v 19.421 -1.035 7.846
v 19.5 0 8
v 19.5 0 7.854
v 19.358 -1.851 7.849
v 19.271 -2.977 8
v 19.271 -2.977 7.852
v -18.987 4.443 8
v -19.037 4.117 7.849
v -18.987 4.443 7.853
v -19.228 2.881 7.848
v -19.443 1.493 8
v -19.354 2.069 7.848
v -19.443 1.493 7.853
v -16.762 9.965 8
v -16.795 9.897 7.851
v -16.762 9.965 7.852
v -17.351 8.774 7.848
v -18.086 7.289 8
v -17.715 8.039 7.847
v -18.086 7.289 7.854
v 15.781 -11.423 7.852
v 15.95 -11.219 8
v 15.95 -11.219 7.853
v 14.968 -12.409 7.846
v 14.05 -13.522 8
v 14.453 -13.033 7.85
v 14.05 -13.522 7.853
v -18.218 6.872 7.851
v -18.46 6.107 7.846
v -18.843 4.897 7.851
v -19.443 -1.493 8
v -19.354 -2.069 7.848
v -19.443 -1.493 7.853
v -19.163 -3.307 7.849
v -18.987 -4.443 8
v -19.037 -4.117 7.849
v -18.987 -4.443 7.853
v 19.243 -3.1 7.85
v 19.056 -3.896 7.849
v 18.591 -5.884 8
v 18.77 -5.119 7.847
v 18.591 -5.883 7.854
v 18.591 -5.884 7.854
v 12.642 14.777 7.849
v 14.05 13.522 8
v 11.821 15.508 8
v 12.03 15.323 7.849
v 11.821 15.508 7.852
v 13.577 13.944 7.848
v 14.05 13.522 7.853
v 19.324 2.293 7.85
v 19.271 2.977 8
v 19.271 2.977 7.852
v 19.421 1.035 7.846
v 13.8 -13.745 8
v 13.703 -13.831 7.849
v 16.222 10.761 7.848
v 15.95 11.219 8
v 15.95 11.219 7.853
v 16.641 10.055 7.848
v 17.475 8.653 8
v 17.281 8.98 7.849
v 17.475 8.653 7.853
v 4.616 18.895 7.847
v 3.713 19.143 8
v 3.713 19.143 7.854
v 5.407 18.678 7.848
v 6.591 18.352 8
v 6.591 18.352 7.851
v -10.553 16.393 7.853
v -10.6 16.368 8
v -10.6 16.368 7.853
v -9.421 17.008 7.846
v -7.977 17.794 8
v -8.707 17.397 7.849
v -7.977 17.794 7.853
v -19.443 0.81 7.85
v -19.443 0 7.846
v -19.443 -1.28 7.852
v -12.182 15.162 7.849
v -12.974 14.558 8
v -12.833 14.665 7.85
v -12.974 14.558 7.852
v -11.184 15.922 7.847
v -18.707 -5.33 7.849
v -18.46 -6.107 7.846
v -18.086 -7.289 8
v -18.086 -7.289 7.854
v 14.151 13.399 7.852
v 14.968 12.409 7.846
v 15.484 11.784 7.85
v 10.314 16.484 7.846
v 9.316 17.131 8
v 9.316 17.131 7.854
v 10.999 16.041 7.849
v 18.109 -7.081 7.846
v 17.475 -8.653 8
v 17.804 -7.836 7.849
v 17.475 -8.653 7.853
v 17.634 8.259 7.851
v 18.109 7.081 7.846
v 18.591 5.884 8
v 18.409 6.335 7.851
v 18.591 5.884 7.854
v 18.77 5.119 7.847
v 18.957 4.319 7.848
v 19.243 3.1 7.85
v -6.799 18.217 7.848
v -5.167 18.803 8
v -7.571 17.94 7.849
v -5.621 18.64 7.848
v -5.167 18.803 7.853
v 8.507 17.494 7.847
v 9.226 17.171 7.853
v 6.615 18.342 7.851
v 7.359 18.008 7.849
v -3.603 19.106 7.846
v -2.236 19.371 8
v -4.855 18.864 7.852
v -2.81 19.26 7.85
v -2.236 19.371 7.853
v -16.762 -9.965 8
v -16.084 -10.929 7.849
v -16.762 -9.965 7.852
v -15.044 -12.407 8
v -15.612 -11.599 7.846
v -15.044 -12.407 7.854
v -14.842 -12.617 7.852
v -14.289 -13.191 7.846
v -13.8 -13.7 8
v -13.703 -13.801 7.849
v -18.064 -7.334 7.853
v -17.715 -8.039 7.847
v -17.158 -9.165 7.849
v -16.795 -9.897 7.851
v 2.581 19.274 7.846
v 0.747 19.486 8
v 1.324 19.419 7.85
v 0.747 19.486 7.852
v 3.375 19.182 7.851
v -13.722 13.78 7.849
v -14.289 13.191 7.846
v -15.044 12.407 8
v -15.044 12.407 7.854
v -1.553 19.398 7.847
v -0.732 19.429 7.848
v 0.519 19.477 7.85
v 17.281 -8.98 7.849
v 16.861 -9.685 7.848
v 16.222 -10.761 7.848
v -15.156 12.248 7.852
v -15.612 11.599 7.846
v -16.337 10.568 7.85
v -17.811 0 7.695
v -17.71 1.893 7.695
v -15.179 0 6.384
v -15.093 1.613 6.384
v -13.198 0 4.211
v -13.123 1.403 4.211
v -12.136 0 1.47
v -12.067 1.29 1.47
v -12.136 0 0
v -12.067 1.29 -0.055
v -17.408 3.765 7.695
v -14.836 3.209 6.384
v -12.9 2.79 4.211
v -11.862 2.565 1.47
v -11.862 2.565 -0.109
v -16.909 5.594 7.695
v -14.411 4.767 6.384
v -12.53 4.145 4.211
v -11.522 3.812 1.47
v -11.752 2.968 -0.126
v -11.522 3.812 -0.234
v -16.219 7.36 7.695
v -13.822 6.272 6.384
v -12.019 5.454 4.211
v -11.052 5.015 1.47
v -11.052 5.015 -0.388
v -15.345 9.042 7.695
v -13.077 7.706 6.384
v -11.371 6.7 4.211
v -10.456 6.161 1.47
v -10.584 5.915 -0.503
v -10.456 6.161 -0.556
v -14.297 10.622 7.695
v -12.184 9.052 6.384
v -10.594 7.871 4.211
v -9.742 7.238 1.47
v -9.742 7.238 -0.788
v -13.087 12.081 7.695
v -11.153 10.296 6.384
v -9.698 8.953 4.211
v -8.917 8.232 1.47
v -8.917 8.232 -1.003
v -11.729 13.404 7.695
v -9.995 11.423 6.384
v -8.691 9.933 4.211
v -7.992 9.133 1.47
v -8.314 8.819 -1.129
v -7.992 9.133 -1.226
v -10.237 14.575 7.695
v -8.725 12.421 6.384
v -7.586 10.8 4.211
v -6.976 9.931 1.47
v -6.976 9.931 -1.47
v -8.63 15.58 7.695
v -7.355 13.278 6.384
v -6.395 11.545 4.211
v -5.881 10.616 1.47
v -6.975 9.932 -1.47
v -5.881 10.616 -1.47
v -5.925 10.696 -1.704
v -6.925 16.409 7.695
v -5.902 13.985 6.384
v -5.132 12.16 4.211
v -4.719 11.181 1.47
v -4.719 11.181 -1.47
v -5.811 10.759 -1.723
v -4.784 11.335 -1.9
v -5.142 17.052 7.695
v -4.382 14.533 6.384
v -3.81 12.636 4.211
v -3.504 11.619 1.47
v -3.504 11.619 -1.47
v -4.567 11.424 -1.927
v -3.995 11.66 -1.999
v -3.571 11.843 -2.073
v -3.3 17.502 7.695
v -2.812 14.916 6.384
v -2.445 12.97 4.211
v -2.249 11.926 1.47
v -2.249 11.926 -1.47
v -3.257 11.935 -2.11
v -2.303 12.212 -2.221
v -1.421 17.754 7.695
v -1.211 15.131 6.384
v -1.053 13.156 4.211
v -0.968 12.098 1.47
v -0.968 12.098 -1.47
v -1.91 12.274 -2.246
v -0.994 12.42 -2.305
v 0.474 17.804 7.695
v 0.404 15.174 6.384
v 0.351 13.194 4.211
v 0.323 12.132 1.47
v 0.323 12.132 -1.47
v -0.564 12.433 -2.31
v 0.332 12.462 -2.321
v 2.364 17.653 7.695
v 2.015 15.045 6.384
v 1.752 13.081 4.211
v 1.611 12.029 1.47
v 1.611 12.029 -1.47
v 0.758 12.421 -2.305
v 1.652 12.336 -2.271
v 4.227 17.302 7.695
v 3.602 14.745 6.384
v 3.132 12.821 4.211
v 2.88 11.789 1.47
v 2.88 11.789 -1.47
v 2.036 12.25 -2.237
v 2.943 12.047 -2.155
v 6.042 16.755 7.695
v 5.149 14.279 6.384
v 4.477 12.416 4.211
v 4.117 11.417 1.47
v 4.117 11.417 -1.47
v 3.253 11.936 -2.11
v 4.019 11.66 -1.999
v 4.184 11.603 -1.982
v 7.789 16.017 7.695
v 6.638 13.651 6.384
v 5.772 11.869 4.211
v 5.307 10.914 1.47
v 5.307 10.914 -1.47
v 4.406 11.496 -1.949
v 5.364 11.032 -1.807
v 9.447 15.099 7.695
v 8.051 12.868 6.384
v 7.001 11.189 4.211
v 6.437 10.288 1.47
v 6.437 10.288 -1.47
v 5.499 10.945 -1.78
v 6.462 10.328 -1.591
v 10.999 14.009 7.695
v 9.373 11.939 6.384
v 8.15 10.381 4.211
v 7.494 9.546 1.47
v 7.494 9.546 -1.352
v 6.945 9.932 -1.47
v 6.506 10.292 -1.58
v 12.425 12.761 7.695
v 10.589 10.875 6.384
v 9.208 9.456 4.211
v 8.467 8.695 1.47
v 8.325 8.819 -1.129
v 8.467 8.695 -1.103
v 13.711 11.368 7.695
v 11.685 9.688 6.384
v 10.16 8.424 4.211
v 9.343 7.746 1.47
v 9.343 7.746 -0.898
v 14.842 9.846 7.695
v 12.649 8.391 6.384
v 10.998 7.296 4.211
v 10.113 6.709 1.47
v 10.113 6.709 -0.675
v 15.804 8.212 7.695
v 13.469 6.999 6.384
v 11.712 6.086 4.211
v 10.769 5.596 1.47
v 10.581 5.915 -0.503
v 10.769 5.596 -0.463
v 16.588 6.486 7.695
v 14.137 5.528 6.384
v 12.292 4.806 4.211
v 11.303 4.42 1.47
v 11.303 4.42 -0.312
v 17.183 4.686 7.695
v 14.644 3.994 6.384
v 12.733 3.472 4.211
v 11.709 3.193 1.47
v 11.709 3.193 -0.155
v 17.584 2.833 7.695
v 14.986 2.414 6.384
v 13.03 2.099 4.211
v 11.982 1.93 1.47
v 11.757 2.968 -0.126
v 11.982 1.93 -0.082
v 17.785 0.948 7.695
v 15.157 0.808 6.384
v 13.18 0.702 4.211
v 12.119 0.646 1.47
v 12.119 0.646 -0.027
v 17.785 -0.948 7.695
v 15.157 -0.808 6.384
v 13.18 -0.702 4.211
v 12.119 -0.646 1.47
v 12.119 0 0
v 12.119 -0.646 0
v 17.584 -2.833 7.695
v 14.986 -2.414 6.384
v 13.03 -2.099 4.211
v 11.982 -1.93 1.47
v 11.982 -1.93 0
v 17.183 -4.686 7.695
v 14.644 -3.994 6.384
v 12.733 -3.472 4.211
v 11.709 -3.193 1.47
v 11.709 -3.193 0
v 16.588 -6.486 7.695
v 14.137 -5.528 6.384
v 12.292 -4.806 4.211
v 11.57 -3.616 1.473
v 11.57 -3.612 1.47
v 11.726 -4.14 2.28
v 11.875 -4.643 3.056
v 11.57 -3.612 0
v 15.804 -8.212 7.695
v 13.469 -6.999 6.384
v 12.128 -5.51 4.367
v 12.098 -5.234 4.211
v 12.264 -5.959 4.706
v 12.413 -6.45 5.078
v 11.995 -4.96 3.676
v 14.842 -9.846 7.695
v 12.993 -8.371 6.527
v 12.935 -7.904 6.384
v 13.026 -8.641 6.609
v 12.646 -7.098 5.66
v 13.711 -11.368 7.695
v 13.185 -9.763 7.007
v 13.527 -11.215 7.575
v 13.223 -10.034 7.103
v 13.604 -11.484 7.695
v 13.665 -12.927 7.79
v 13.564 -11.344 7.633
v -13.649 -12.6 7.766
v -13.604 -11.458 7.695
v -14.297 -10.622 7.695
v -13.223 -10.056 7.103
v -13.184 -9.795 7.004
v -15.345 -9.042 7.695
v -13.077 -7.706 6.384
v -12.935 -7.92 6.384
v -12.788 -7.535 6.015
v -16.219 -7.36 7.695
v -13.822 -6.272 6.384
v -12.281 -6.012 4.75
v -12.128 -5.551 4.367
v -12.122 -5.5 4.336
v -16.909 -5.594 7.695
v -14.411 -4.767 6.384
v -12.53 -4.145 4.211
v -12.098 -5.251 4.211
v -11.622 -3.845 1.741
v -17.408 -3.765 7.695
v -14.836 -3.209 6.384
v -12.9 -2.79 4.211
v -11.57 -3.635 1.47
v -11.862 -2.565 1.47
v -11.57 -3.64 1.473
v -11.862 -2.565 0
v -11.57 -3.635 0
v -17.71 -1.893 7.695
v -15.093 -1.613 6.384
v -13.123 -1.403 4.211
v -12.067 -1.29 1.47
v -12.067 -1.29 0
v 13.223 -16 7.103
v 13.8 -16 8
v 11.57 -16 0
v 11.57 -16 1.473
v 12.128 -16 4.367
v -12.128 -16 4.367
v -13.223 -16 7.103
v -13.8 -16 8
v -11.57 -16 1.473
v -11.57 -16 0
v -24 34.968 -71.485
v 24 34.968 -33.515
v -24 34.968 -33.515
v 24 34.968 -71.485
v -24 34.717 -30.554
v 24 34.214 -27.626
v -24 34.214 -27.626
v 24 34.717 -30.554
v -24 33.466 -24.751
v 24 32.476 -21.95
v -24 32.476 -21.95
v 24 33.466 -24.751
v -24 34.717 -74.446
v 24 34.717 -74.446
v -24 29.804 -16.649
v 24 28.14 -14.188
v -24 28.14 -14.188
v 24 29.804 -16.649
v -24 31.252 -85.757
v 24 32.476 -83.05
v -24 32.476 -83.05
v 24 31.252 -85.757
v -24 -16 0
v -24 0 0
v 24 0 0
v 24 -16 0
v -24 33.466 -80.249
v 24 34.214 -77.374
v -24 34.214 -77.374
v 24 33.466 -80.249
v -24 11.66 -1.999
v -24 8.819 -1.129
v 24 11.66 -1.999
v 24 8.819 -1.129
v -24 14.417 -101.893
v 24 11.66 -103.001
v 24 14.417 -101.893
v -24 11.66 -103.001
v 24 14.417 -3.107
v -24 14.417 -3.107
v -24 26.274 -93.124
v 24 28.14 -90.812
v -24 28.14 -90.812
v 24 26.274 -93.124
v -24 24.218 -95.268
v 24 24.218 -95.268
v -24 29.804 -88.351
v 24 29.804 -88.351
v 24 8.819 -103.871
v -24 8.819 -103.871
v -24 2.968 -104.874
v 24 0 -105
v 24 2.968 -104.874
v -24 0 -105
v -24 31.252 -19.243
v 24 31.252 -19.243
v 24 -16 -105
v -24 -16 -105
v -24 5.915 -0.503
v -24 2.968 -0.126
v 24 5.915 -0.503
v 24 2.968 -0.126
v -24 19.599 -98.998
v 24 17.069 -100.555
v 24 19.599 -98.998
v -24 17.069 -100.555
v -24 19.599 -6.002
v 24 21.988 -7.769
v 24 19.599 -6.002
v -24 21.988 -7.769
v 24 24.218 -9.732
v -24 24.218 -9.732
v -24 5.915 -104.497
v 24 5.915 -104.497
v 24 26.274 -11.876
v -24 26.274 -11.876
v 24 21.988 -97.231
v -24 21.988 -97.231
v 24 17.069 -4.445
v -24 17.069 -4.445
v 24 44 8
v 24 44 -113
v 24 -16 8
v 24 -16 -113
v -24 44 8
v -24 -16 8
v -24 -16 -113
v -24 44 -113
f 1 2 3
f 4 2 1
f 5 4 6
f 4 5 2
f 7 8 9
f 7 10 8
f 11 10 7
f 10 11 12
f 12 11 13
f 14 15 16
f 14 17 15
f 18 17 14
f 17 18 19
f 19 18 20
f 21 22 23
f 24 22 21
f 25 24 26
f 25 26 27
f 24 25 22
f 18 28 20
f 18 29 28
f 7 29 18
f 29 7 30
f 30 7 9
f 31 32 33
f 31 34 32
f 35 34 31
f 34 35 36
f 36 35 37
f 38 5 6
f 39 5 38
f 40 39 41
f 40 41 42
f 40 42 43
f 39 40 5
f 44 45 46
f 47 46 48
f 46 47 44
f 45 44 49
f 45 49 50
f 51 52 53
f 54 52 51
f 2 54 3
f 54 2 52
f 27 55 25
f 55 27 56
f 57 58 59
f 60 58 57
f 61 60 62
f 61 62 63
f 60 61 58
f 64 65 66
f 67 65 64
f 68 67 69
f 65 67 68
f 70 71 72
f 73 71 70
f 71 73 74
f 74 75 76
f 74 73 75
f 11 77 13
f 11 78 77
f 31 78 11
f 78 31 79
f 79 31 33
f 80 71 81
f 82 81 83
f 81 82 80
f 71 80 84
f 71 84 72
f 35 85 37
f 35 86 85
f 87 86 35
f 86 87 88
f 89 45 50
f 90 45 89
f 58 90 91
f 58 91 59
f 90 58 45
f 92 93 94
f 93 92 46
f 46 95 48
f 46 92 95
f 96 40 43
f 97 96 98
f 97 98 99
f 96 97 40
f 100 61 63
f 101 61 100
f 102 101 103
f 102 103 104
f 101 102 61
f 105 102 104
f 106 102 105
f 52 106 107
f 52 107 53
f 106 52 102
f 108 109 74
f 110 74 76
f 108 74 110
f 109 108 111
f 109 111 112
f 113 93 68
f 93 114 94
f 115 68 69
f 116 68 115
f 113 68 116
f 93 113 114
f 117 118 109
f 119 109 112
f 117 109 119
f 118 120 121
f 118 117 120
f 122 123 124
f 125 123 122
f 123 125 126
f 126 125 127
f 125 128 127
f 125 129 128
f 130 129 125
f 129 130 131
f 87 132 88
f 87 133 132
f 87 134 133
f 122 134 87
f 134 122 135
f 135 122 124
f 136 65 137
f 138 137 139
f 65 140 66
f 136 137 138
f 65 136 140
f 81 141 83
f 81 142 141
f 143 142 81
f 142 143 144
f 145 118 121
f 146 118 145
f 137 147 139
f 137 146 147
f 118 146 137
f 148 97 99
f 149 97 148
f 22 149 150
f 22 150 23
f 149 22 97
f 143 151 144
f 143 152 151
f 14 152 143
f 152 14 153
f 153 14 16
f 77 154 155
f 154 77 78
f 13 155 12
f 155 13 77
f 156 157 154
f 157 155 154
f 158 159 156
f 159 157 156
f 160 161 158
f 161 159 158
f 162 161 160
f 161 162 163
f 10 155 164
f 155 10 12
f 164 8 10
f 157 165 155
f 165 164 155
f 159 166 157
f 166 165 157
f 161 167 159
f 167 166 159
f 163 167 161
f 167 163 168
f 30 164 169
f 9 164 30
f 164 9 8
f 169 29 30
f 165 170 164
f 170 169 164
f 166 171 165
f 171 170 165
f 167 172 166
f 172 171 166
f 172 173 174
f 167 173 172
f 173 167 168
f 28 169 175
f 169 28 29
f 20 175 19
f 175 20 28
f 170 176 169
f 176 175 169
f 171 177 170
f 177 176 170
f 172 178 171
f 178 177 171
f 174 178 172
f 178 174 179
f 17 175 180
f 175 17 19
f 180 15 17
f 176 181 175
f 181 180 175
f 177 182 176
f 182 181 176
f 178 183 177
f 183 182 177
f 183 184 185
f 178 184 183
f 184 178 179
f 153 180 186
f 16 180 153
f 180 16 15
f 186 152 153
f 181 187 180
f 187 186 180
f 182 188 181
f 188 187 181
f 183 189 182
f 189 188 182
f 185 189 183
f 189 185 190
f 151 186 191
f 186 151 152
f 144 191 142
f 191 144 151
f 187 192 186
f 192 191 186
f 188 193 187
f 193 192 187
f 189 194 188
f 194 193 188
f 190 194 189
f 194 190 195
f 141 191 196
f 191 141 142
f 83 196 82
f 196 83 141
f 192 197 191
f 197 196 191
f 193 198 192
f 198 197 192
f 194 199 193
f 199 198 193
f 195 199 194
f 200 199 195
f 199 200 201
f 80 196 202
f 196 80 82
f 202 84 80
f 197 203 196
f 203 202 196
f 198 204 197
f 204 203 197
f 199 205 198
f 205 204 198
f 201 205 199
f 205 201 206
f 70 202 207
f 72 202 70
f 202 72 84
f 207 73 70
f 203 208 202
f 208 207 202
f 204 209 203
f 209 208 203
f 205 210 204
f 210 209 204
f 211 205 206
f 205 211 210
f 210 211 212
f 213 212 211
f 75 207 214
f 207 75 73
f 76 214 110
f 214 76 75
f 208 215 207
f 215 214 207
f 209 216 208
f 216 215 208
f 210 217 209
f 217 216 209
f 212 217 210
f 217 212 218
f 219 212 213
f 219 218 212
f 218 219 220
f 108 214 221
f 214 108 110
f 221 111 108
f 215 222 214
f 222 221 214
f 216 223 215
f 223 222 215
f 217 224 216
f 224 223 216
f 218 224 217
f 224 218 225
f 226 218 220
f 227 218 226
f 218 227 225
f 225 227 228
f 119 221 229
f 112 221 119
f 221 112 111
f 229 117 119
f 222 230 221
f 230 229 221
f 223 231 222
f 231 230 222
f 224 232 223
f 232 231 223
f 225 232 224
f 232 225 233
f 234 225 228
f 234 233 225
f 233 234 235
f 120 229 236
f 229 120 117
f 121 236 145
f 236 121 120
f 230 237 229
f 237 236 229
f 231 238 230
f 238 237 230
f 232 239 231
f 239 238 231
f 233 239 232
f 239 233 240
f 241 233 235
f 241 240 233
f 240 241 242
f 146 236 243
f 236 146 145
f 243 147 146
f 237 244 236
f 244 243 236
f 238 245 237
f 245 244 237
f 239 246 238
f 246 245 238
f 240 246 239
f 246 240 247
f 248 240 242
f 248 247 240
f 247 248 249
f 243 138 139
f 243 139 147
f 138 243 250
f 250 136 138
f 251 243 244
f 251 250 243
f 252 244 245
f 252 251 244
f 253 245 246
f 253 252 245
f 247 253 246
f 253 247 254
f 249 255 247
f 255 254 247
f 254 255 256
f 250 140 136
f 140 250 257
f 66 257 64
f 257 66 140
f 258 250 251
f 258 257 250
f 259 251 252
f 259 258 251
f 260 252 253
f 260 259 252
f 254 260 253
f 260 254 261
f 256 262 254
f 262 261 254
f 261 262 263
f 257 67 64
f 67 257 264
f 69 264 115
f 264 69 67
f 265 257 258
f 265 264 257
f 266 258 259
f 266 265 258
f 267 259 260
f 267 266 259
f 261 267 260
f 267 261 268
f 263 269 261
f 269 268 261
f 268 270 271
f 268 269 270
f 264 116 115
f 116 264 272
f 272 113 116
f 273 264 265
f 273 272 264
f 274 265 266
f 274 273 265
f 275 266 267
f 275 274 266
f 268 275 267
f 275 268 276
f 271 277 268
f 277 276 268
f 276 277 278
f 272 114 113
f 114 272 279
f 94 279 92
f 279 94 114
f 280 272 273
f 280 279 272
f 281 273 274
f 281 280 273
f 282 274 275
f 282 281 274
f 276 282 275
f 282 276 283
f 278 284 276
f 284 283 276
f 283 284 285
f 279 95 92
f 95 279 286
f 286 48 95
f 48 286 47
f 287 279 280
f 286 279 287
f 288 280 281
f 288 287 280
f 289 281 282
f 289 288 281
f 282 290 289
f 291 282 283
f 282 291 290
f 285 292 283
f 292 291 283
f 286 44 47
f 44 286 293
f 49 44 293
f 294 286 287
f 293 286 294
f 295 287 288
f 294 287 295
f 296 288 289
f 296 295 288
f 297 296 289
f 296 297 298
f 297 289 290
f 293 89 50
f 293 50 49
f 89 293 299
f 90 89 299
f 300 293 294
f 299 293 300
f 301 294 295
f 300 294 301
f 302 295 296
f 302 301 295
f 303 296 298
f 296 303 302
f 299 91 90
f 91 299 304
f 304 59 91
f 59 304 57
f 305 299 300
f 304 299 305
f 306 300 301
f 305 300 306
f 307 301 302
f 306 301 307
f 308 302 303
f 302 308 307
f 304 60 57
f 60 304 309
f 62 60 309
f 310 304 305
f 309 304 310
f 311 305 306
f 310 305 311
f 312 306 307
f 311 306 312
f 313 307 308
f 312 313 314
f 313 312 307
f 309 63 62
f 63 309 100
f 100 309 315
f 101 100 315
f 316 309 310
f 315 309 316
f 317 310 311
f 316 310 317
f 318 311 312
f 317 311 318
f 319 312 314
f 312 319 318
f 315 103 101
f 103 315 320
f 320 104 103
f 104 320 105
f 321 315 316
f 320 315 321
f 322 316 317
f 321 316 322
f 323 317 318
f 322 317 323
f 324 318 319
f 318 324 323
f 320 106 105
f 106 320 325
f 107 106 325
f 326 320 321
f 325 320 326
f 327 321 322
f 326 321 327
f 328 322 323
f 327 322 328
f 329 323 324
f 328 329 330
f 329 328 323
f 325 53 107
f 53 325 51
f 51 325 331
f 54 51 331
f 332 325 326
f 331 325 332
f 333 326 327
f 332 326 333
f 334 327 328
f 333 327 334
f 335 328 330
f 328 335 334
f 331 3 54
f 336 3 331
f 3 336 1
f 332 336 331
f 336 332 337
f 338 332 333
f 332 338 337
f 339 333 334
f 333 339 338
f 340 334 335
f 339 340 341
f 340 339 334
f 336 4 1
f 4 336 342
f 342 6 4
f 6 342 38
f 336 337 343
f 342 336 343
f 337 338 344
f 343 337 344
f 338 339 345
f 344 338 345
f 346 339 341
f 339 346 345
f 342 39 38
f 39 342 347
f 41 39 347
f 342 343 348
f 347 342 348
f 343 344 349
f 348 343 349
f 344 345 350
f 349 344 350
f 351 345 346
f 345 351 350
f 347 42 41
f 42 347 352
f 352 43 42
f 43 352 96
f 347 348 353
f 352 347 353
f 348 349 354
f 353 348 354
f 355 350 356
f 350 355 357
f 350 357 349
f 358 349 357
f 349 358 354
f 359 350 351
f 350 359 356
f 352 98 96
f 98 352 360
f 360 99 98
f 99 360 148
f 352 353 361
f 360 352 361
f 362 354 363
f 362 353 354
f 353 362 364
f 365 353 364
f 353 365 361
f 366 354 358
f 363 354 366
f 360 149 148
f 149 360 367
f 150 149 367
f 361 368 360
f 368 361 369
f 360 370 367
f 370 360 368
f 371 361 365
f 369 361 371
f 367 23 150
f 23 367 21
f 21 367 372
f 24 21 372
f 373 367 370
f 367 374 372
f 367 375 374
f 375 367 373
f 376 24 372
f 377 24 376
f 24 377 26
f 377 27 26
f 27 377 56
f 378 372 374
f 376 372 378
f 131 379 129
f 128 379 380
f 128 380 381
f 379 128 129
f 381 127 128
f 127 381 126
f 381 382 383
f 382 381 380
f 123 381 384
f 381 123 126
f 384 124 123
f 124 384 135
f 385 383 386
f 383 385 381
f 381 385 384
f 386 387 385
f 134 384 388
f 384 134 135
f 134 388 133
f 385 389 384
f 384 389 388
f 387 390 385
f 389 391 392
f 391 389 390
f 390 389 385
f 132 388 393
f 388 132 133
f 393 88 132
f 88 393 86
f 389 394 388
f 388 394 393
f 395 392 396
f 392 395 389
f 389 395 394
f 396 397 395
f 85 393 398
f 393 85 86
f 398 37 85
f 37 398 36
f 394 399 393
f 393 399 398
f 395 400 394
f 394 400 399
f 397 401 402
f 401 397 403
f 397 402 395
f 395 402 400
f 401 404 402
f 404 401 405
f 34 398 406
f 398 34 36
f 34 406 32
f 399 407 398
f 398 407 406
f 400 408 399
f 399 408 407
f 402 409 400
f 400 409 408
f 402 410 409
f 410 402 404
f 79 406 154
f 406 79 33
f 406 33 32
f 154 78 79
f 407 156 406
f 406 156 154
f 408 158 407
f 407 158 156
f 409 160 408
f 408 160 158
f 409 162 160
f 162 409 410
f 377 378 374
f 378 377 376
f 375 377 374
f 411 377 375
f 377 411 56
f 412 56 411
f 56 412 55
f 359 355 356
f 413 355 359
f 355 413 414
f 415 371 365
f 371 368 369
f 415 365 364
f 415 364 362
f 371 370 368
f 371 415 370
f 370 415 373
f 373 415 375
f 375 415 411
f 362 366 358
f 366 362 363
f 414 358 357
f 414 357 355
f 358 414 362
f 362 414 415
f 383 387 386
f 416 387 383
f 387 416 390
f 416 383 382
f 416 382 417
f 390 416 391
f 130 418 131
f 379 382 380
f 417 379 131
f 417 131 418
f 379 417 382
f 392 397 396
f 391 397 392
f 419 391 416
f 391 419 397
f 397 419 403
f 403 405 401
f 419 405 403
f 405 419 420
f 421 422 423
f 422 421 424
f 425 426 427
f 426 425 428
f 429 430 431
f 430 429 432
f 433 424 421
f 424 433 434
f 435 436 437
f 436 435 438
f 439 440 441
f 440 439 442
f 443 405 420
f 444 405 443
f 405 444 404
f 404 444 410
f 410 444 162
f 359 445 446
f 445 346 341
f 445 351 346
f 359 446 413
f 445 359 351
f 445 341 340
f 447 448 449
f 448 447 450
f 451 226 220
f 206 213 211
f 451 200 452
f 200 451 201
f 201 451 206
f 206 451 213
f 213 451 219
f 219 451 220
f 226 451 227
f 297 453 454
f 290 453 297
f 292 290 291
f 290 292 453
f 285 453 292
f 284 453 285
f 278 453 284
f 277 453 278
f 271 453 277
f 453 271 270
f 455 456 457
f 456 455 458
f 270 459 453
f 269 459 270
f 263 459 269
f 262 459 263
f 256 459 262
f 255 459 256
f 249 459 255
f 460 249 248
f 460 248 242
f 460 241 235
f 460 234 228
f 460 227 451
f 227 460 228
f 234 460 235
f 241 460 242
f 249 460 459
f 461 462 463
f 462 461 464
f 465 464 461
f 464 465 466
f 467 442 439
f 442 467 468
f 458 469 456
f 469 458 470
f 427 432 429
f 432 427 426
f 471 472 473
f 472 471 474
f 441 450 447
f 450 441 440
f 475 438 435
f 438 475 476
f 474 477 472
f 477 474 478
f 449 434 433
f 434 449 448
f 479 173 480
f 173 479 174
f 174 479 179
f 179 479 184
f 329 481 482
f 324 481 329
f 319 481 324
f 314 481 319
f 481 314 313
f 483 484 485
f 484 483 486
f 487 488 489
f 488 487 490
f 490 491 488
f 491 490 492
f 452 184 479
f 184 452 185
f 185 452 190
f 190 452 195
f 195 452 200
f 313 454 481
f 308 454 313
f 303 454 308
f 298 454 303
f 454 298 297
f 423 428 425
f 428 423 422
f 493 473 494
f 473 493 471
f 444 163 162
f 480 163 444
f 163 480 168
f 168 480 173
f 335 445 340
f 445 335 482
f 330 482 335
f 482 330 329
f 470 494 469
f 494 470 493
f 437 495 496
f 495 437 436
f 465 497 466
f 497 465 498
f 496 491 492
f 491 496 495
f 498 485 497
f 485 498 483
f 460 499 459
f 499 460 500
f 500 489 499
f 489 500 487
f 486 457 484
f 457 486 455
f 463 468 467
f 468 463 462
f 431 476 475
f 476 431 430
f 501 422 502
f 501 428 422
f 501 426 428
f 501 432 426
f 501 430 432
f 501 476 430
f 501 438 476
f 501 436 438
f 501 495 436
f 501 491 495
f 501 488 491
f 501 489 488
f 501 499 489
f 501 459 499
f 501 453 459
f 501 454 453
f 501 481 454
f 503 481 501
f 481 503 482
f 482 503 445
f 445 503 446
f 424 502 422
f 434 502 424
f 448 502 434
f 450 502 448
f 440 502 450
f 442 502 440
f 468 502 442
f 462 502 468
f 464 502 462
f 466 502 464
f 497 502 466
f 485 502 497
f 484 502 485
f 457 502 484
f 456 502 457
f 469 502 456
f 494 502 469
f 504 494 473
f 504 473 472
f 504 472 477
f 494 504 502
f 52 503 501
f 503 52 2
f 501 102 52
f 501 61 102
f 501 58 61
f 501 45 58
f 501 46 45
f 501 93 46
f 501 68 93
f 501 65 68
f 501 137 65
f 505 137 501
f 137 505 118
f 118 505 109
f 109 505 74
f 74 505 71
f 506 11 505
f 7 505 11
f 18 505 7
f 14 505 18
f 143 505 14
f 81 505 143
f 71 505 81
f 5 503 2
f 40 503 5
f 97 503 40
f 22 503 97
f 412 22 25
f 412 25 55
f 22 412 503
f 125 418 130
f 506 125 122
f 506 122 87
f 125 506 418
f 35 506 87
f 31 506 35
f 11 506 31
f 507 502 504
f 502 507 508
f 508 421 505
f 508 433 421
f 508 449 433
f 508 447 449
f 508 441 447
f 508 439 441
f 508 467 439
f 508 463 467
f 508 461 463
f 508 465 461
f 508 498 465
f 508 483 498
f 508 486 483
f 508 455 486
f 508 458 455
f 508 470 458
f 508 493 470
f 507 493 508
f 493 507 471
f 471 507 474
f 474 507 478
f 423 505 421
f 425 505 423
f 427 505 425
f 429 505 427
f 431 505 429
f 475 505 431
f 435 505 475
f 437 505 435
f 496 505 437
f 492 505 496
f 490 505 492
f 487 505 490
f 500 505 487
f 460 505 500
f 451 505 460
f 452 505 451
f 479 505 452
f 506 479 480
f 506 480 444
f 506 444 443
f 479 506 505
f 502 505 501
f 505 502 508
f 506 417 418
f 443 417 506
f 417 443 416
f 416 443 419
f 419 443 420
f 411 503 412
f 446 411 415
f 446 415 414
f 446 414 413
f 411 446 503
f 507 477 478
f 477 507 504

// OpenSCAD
$fa = .01;
$fs = 3;
bristles_diameter = 60;
brush_height = 115;
narrow_width = 22.0;
torus_diameter=30;
shank_height = 30;
shank_midheight = 15;
bulb_height=40;
bulb_diameter=40;

stand_width = 70;
stand_thickness=8;
brush_gap = 5;
torus_slop=1;
stand_width_top = narrow_width+4*stand_thickness+2*torus_slop;

module mirror2(xyz){
  children();
  mirror(xyz) children();
}


module brush(){
    difference(){
        union(){
            cylinder(d=35,h=shank_height);
            translate([0,0,brush_height-bristles_diameter/2]) sphere(d = bristles_diameter);
            translate([0,0,bulb_height]) sphere(d = bulb_diameter);
        }
        translate([0,0,shank_midheight]) rotate_extrude() translate([0.5*(narrow_width+torus_diameter),0]) circle(d=torus_diameter);
    }

}

swoop_diameter = bristles_diameter+2*brush_gap;
module subtractor(){
    //torus
    difference() {
        cylinder(d=(narrow_width+2*stand_thickness)+torus_slop,h=99, center=true);
        rotate_extrude()
            translate([0.5*(narrow_width+2*stand_thickness)+torus_slop,0]) circle(d=2*stand_thickness);
    }
    //exit
    difference(){
        spacing=narrow_width/2+torus_slop+torus_diameter/2;
        translate([-spacing,-49,-stand_thickness]) cube([spacing*2,49,49]);
        mirror2([1,0,0]){
            translate([spacing,0])
            rotate([90,0,0]) cylinder(d=torus_diameter+torus_slop,h=99, center=true);
        }
    }
    //swoops
     hull() for(dy=[0,-100])translate([0,dy,0]){
        translate([0,0,-brush_height+shank_midheight+bristles_diameter/2])
            rotate([0,90,0])
                cylinder(d=swoop_diameter,h=stand_width+.2, center=true);
        translate([0,0,-swoop_diameter/2])
            rotate([0,90,0])
                cylinder(d=swoop_diameter,h=stand_width+.2, center=true);
    }
}

h_overall = brush_height-shank_midheight+2*stand_thickness+brush_gap;

module stand1(){
    difference(){
        union(){
            translate([0,0,stand_thickness]) mirror([0,0,1]) cylinder(d1=stand_width_top, d2=stand_width,h=h_overall);
            translate([-stand_width_top/2,0,stand_thickness])  mirror([0,0,1]) cube([stand_width_top,bristles_diameter/2 + brush_gap + stand_thickness,h_overall]);
        }
        subtractor();
    }
};

module stand2(){
    w=stand_width_top-stand_thickness;
    l=60;
    difference(){
        translate([-w/2,-w/2+stand_thickness,stand_thickness-h_overall]) cube([w,l,h_overall]);
        subtractor();
    }
}

translate([0,0,shank_midheight])mirror([0,0,1]) %brush();
stand2();
